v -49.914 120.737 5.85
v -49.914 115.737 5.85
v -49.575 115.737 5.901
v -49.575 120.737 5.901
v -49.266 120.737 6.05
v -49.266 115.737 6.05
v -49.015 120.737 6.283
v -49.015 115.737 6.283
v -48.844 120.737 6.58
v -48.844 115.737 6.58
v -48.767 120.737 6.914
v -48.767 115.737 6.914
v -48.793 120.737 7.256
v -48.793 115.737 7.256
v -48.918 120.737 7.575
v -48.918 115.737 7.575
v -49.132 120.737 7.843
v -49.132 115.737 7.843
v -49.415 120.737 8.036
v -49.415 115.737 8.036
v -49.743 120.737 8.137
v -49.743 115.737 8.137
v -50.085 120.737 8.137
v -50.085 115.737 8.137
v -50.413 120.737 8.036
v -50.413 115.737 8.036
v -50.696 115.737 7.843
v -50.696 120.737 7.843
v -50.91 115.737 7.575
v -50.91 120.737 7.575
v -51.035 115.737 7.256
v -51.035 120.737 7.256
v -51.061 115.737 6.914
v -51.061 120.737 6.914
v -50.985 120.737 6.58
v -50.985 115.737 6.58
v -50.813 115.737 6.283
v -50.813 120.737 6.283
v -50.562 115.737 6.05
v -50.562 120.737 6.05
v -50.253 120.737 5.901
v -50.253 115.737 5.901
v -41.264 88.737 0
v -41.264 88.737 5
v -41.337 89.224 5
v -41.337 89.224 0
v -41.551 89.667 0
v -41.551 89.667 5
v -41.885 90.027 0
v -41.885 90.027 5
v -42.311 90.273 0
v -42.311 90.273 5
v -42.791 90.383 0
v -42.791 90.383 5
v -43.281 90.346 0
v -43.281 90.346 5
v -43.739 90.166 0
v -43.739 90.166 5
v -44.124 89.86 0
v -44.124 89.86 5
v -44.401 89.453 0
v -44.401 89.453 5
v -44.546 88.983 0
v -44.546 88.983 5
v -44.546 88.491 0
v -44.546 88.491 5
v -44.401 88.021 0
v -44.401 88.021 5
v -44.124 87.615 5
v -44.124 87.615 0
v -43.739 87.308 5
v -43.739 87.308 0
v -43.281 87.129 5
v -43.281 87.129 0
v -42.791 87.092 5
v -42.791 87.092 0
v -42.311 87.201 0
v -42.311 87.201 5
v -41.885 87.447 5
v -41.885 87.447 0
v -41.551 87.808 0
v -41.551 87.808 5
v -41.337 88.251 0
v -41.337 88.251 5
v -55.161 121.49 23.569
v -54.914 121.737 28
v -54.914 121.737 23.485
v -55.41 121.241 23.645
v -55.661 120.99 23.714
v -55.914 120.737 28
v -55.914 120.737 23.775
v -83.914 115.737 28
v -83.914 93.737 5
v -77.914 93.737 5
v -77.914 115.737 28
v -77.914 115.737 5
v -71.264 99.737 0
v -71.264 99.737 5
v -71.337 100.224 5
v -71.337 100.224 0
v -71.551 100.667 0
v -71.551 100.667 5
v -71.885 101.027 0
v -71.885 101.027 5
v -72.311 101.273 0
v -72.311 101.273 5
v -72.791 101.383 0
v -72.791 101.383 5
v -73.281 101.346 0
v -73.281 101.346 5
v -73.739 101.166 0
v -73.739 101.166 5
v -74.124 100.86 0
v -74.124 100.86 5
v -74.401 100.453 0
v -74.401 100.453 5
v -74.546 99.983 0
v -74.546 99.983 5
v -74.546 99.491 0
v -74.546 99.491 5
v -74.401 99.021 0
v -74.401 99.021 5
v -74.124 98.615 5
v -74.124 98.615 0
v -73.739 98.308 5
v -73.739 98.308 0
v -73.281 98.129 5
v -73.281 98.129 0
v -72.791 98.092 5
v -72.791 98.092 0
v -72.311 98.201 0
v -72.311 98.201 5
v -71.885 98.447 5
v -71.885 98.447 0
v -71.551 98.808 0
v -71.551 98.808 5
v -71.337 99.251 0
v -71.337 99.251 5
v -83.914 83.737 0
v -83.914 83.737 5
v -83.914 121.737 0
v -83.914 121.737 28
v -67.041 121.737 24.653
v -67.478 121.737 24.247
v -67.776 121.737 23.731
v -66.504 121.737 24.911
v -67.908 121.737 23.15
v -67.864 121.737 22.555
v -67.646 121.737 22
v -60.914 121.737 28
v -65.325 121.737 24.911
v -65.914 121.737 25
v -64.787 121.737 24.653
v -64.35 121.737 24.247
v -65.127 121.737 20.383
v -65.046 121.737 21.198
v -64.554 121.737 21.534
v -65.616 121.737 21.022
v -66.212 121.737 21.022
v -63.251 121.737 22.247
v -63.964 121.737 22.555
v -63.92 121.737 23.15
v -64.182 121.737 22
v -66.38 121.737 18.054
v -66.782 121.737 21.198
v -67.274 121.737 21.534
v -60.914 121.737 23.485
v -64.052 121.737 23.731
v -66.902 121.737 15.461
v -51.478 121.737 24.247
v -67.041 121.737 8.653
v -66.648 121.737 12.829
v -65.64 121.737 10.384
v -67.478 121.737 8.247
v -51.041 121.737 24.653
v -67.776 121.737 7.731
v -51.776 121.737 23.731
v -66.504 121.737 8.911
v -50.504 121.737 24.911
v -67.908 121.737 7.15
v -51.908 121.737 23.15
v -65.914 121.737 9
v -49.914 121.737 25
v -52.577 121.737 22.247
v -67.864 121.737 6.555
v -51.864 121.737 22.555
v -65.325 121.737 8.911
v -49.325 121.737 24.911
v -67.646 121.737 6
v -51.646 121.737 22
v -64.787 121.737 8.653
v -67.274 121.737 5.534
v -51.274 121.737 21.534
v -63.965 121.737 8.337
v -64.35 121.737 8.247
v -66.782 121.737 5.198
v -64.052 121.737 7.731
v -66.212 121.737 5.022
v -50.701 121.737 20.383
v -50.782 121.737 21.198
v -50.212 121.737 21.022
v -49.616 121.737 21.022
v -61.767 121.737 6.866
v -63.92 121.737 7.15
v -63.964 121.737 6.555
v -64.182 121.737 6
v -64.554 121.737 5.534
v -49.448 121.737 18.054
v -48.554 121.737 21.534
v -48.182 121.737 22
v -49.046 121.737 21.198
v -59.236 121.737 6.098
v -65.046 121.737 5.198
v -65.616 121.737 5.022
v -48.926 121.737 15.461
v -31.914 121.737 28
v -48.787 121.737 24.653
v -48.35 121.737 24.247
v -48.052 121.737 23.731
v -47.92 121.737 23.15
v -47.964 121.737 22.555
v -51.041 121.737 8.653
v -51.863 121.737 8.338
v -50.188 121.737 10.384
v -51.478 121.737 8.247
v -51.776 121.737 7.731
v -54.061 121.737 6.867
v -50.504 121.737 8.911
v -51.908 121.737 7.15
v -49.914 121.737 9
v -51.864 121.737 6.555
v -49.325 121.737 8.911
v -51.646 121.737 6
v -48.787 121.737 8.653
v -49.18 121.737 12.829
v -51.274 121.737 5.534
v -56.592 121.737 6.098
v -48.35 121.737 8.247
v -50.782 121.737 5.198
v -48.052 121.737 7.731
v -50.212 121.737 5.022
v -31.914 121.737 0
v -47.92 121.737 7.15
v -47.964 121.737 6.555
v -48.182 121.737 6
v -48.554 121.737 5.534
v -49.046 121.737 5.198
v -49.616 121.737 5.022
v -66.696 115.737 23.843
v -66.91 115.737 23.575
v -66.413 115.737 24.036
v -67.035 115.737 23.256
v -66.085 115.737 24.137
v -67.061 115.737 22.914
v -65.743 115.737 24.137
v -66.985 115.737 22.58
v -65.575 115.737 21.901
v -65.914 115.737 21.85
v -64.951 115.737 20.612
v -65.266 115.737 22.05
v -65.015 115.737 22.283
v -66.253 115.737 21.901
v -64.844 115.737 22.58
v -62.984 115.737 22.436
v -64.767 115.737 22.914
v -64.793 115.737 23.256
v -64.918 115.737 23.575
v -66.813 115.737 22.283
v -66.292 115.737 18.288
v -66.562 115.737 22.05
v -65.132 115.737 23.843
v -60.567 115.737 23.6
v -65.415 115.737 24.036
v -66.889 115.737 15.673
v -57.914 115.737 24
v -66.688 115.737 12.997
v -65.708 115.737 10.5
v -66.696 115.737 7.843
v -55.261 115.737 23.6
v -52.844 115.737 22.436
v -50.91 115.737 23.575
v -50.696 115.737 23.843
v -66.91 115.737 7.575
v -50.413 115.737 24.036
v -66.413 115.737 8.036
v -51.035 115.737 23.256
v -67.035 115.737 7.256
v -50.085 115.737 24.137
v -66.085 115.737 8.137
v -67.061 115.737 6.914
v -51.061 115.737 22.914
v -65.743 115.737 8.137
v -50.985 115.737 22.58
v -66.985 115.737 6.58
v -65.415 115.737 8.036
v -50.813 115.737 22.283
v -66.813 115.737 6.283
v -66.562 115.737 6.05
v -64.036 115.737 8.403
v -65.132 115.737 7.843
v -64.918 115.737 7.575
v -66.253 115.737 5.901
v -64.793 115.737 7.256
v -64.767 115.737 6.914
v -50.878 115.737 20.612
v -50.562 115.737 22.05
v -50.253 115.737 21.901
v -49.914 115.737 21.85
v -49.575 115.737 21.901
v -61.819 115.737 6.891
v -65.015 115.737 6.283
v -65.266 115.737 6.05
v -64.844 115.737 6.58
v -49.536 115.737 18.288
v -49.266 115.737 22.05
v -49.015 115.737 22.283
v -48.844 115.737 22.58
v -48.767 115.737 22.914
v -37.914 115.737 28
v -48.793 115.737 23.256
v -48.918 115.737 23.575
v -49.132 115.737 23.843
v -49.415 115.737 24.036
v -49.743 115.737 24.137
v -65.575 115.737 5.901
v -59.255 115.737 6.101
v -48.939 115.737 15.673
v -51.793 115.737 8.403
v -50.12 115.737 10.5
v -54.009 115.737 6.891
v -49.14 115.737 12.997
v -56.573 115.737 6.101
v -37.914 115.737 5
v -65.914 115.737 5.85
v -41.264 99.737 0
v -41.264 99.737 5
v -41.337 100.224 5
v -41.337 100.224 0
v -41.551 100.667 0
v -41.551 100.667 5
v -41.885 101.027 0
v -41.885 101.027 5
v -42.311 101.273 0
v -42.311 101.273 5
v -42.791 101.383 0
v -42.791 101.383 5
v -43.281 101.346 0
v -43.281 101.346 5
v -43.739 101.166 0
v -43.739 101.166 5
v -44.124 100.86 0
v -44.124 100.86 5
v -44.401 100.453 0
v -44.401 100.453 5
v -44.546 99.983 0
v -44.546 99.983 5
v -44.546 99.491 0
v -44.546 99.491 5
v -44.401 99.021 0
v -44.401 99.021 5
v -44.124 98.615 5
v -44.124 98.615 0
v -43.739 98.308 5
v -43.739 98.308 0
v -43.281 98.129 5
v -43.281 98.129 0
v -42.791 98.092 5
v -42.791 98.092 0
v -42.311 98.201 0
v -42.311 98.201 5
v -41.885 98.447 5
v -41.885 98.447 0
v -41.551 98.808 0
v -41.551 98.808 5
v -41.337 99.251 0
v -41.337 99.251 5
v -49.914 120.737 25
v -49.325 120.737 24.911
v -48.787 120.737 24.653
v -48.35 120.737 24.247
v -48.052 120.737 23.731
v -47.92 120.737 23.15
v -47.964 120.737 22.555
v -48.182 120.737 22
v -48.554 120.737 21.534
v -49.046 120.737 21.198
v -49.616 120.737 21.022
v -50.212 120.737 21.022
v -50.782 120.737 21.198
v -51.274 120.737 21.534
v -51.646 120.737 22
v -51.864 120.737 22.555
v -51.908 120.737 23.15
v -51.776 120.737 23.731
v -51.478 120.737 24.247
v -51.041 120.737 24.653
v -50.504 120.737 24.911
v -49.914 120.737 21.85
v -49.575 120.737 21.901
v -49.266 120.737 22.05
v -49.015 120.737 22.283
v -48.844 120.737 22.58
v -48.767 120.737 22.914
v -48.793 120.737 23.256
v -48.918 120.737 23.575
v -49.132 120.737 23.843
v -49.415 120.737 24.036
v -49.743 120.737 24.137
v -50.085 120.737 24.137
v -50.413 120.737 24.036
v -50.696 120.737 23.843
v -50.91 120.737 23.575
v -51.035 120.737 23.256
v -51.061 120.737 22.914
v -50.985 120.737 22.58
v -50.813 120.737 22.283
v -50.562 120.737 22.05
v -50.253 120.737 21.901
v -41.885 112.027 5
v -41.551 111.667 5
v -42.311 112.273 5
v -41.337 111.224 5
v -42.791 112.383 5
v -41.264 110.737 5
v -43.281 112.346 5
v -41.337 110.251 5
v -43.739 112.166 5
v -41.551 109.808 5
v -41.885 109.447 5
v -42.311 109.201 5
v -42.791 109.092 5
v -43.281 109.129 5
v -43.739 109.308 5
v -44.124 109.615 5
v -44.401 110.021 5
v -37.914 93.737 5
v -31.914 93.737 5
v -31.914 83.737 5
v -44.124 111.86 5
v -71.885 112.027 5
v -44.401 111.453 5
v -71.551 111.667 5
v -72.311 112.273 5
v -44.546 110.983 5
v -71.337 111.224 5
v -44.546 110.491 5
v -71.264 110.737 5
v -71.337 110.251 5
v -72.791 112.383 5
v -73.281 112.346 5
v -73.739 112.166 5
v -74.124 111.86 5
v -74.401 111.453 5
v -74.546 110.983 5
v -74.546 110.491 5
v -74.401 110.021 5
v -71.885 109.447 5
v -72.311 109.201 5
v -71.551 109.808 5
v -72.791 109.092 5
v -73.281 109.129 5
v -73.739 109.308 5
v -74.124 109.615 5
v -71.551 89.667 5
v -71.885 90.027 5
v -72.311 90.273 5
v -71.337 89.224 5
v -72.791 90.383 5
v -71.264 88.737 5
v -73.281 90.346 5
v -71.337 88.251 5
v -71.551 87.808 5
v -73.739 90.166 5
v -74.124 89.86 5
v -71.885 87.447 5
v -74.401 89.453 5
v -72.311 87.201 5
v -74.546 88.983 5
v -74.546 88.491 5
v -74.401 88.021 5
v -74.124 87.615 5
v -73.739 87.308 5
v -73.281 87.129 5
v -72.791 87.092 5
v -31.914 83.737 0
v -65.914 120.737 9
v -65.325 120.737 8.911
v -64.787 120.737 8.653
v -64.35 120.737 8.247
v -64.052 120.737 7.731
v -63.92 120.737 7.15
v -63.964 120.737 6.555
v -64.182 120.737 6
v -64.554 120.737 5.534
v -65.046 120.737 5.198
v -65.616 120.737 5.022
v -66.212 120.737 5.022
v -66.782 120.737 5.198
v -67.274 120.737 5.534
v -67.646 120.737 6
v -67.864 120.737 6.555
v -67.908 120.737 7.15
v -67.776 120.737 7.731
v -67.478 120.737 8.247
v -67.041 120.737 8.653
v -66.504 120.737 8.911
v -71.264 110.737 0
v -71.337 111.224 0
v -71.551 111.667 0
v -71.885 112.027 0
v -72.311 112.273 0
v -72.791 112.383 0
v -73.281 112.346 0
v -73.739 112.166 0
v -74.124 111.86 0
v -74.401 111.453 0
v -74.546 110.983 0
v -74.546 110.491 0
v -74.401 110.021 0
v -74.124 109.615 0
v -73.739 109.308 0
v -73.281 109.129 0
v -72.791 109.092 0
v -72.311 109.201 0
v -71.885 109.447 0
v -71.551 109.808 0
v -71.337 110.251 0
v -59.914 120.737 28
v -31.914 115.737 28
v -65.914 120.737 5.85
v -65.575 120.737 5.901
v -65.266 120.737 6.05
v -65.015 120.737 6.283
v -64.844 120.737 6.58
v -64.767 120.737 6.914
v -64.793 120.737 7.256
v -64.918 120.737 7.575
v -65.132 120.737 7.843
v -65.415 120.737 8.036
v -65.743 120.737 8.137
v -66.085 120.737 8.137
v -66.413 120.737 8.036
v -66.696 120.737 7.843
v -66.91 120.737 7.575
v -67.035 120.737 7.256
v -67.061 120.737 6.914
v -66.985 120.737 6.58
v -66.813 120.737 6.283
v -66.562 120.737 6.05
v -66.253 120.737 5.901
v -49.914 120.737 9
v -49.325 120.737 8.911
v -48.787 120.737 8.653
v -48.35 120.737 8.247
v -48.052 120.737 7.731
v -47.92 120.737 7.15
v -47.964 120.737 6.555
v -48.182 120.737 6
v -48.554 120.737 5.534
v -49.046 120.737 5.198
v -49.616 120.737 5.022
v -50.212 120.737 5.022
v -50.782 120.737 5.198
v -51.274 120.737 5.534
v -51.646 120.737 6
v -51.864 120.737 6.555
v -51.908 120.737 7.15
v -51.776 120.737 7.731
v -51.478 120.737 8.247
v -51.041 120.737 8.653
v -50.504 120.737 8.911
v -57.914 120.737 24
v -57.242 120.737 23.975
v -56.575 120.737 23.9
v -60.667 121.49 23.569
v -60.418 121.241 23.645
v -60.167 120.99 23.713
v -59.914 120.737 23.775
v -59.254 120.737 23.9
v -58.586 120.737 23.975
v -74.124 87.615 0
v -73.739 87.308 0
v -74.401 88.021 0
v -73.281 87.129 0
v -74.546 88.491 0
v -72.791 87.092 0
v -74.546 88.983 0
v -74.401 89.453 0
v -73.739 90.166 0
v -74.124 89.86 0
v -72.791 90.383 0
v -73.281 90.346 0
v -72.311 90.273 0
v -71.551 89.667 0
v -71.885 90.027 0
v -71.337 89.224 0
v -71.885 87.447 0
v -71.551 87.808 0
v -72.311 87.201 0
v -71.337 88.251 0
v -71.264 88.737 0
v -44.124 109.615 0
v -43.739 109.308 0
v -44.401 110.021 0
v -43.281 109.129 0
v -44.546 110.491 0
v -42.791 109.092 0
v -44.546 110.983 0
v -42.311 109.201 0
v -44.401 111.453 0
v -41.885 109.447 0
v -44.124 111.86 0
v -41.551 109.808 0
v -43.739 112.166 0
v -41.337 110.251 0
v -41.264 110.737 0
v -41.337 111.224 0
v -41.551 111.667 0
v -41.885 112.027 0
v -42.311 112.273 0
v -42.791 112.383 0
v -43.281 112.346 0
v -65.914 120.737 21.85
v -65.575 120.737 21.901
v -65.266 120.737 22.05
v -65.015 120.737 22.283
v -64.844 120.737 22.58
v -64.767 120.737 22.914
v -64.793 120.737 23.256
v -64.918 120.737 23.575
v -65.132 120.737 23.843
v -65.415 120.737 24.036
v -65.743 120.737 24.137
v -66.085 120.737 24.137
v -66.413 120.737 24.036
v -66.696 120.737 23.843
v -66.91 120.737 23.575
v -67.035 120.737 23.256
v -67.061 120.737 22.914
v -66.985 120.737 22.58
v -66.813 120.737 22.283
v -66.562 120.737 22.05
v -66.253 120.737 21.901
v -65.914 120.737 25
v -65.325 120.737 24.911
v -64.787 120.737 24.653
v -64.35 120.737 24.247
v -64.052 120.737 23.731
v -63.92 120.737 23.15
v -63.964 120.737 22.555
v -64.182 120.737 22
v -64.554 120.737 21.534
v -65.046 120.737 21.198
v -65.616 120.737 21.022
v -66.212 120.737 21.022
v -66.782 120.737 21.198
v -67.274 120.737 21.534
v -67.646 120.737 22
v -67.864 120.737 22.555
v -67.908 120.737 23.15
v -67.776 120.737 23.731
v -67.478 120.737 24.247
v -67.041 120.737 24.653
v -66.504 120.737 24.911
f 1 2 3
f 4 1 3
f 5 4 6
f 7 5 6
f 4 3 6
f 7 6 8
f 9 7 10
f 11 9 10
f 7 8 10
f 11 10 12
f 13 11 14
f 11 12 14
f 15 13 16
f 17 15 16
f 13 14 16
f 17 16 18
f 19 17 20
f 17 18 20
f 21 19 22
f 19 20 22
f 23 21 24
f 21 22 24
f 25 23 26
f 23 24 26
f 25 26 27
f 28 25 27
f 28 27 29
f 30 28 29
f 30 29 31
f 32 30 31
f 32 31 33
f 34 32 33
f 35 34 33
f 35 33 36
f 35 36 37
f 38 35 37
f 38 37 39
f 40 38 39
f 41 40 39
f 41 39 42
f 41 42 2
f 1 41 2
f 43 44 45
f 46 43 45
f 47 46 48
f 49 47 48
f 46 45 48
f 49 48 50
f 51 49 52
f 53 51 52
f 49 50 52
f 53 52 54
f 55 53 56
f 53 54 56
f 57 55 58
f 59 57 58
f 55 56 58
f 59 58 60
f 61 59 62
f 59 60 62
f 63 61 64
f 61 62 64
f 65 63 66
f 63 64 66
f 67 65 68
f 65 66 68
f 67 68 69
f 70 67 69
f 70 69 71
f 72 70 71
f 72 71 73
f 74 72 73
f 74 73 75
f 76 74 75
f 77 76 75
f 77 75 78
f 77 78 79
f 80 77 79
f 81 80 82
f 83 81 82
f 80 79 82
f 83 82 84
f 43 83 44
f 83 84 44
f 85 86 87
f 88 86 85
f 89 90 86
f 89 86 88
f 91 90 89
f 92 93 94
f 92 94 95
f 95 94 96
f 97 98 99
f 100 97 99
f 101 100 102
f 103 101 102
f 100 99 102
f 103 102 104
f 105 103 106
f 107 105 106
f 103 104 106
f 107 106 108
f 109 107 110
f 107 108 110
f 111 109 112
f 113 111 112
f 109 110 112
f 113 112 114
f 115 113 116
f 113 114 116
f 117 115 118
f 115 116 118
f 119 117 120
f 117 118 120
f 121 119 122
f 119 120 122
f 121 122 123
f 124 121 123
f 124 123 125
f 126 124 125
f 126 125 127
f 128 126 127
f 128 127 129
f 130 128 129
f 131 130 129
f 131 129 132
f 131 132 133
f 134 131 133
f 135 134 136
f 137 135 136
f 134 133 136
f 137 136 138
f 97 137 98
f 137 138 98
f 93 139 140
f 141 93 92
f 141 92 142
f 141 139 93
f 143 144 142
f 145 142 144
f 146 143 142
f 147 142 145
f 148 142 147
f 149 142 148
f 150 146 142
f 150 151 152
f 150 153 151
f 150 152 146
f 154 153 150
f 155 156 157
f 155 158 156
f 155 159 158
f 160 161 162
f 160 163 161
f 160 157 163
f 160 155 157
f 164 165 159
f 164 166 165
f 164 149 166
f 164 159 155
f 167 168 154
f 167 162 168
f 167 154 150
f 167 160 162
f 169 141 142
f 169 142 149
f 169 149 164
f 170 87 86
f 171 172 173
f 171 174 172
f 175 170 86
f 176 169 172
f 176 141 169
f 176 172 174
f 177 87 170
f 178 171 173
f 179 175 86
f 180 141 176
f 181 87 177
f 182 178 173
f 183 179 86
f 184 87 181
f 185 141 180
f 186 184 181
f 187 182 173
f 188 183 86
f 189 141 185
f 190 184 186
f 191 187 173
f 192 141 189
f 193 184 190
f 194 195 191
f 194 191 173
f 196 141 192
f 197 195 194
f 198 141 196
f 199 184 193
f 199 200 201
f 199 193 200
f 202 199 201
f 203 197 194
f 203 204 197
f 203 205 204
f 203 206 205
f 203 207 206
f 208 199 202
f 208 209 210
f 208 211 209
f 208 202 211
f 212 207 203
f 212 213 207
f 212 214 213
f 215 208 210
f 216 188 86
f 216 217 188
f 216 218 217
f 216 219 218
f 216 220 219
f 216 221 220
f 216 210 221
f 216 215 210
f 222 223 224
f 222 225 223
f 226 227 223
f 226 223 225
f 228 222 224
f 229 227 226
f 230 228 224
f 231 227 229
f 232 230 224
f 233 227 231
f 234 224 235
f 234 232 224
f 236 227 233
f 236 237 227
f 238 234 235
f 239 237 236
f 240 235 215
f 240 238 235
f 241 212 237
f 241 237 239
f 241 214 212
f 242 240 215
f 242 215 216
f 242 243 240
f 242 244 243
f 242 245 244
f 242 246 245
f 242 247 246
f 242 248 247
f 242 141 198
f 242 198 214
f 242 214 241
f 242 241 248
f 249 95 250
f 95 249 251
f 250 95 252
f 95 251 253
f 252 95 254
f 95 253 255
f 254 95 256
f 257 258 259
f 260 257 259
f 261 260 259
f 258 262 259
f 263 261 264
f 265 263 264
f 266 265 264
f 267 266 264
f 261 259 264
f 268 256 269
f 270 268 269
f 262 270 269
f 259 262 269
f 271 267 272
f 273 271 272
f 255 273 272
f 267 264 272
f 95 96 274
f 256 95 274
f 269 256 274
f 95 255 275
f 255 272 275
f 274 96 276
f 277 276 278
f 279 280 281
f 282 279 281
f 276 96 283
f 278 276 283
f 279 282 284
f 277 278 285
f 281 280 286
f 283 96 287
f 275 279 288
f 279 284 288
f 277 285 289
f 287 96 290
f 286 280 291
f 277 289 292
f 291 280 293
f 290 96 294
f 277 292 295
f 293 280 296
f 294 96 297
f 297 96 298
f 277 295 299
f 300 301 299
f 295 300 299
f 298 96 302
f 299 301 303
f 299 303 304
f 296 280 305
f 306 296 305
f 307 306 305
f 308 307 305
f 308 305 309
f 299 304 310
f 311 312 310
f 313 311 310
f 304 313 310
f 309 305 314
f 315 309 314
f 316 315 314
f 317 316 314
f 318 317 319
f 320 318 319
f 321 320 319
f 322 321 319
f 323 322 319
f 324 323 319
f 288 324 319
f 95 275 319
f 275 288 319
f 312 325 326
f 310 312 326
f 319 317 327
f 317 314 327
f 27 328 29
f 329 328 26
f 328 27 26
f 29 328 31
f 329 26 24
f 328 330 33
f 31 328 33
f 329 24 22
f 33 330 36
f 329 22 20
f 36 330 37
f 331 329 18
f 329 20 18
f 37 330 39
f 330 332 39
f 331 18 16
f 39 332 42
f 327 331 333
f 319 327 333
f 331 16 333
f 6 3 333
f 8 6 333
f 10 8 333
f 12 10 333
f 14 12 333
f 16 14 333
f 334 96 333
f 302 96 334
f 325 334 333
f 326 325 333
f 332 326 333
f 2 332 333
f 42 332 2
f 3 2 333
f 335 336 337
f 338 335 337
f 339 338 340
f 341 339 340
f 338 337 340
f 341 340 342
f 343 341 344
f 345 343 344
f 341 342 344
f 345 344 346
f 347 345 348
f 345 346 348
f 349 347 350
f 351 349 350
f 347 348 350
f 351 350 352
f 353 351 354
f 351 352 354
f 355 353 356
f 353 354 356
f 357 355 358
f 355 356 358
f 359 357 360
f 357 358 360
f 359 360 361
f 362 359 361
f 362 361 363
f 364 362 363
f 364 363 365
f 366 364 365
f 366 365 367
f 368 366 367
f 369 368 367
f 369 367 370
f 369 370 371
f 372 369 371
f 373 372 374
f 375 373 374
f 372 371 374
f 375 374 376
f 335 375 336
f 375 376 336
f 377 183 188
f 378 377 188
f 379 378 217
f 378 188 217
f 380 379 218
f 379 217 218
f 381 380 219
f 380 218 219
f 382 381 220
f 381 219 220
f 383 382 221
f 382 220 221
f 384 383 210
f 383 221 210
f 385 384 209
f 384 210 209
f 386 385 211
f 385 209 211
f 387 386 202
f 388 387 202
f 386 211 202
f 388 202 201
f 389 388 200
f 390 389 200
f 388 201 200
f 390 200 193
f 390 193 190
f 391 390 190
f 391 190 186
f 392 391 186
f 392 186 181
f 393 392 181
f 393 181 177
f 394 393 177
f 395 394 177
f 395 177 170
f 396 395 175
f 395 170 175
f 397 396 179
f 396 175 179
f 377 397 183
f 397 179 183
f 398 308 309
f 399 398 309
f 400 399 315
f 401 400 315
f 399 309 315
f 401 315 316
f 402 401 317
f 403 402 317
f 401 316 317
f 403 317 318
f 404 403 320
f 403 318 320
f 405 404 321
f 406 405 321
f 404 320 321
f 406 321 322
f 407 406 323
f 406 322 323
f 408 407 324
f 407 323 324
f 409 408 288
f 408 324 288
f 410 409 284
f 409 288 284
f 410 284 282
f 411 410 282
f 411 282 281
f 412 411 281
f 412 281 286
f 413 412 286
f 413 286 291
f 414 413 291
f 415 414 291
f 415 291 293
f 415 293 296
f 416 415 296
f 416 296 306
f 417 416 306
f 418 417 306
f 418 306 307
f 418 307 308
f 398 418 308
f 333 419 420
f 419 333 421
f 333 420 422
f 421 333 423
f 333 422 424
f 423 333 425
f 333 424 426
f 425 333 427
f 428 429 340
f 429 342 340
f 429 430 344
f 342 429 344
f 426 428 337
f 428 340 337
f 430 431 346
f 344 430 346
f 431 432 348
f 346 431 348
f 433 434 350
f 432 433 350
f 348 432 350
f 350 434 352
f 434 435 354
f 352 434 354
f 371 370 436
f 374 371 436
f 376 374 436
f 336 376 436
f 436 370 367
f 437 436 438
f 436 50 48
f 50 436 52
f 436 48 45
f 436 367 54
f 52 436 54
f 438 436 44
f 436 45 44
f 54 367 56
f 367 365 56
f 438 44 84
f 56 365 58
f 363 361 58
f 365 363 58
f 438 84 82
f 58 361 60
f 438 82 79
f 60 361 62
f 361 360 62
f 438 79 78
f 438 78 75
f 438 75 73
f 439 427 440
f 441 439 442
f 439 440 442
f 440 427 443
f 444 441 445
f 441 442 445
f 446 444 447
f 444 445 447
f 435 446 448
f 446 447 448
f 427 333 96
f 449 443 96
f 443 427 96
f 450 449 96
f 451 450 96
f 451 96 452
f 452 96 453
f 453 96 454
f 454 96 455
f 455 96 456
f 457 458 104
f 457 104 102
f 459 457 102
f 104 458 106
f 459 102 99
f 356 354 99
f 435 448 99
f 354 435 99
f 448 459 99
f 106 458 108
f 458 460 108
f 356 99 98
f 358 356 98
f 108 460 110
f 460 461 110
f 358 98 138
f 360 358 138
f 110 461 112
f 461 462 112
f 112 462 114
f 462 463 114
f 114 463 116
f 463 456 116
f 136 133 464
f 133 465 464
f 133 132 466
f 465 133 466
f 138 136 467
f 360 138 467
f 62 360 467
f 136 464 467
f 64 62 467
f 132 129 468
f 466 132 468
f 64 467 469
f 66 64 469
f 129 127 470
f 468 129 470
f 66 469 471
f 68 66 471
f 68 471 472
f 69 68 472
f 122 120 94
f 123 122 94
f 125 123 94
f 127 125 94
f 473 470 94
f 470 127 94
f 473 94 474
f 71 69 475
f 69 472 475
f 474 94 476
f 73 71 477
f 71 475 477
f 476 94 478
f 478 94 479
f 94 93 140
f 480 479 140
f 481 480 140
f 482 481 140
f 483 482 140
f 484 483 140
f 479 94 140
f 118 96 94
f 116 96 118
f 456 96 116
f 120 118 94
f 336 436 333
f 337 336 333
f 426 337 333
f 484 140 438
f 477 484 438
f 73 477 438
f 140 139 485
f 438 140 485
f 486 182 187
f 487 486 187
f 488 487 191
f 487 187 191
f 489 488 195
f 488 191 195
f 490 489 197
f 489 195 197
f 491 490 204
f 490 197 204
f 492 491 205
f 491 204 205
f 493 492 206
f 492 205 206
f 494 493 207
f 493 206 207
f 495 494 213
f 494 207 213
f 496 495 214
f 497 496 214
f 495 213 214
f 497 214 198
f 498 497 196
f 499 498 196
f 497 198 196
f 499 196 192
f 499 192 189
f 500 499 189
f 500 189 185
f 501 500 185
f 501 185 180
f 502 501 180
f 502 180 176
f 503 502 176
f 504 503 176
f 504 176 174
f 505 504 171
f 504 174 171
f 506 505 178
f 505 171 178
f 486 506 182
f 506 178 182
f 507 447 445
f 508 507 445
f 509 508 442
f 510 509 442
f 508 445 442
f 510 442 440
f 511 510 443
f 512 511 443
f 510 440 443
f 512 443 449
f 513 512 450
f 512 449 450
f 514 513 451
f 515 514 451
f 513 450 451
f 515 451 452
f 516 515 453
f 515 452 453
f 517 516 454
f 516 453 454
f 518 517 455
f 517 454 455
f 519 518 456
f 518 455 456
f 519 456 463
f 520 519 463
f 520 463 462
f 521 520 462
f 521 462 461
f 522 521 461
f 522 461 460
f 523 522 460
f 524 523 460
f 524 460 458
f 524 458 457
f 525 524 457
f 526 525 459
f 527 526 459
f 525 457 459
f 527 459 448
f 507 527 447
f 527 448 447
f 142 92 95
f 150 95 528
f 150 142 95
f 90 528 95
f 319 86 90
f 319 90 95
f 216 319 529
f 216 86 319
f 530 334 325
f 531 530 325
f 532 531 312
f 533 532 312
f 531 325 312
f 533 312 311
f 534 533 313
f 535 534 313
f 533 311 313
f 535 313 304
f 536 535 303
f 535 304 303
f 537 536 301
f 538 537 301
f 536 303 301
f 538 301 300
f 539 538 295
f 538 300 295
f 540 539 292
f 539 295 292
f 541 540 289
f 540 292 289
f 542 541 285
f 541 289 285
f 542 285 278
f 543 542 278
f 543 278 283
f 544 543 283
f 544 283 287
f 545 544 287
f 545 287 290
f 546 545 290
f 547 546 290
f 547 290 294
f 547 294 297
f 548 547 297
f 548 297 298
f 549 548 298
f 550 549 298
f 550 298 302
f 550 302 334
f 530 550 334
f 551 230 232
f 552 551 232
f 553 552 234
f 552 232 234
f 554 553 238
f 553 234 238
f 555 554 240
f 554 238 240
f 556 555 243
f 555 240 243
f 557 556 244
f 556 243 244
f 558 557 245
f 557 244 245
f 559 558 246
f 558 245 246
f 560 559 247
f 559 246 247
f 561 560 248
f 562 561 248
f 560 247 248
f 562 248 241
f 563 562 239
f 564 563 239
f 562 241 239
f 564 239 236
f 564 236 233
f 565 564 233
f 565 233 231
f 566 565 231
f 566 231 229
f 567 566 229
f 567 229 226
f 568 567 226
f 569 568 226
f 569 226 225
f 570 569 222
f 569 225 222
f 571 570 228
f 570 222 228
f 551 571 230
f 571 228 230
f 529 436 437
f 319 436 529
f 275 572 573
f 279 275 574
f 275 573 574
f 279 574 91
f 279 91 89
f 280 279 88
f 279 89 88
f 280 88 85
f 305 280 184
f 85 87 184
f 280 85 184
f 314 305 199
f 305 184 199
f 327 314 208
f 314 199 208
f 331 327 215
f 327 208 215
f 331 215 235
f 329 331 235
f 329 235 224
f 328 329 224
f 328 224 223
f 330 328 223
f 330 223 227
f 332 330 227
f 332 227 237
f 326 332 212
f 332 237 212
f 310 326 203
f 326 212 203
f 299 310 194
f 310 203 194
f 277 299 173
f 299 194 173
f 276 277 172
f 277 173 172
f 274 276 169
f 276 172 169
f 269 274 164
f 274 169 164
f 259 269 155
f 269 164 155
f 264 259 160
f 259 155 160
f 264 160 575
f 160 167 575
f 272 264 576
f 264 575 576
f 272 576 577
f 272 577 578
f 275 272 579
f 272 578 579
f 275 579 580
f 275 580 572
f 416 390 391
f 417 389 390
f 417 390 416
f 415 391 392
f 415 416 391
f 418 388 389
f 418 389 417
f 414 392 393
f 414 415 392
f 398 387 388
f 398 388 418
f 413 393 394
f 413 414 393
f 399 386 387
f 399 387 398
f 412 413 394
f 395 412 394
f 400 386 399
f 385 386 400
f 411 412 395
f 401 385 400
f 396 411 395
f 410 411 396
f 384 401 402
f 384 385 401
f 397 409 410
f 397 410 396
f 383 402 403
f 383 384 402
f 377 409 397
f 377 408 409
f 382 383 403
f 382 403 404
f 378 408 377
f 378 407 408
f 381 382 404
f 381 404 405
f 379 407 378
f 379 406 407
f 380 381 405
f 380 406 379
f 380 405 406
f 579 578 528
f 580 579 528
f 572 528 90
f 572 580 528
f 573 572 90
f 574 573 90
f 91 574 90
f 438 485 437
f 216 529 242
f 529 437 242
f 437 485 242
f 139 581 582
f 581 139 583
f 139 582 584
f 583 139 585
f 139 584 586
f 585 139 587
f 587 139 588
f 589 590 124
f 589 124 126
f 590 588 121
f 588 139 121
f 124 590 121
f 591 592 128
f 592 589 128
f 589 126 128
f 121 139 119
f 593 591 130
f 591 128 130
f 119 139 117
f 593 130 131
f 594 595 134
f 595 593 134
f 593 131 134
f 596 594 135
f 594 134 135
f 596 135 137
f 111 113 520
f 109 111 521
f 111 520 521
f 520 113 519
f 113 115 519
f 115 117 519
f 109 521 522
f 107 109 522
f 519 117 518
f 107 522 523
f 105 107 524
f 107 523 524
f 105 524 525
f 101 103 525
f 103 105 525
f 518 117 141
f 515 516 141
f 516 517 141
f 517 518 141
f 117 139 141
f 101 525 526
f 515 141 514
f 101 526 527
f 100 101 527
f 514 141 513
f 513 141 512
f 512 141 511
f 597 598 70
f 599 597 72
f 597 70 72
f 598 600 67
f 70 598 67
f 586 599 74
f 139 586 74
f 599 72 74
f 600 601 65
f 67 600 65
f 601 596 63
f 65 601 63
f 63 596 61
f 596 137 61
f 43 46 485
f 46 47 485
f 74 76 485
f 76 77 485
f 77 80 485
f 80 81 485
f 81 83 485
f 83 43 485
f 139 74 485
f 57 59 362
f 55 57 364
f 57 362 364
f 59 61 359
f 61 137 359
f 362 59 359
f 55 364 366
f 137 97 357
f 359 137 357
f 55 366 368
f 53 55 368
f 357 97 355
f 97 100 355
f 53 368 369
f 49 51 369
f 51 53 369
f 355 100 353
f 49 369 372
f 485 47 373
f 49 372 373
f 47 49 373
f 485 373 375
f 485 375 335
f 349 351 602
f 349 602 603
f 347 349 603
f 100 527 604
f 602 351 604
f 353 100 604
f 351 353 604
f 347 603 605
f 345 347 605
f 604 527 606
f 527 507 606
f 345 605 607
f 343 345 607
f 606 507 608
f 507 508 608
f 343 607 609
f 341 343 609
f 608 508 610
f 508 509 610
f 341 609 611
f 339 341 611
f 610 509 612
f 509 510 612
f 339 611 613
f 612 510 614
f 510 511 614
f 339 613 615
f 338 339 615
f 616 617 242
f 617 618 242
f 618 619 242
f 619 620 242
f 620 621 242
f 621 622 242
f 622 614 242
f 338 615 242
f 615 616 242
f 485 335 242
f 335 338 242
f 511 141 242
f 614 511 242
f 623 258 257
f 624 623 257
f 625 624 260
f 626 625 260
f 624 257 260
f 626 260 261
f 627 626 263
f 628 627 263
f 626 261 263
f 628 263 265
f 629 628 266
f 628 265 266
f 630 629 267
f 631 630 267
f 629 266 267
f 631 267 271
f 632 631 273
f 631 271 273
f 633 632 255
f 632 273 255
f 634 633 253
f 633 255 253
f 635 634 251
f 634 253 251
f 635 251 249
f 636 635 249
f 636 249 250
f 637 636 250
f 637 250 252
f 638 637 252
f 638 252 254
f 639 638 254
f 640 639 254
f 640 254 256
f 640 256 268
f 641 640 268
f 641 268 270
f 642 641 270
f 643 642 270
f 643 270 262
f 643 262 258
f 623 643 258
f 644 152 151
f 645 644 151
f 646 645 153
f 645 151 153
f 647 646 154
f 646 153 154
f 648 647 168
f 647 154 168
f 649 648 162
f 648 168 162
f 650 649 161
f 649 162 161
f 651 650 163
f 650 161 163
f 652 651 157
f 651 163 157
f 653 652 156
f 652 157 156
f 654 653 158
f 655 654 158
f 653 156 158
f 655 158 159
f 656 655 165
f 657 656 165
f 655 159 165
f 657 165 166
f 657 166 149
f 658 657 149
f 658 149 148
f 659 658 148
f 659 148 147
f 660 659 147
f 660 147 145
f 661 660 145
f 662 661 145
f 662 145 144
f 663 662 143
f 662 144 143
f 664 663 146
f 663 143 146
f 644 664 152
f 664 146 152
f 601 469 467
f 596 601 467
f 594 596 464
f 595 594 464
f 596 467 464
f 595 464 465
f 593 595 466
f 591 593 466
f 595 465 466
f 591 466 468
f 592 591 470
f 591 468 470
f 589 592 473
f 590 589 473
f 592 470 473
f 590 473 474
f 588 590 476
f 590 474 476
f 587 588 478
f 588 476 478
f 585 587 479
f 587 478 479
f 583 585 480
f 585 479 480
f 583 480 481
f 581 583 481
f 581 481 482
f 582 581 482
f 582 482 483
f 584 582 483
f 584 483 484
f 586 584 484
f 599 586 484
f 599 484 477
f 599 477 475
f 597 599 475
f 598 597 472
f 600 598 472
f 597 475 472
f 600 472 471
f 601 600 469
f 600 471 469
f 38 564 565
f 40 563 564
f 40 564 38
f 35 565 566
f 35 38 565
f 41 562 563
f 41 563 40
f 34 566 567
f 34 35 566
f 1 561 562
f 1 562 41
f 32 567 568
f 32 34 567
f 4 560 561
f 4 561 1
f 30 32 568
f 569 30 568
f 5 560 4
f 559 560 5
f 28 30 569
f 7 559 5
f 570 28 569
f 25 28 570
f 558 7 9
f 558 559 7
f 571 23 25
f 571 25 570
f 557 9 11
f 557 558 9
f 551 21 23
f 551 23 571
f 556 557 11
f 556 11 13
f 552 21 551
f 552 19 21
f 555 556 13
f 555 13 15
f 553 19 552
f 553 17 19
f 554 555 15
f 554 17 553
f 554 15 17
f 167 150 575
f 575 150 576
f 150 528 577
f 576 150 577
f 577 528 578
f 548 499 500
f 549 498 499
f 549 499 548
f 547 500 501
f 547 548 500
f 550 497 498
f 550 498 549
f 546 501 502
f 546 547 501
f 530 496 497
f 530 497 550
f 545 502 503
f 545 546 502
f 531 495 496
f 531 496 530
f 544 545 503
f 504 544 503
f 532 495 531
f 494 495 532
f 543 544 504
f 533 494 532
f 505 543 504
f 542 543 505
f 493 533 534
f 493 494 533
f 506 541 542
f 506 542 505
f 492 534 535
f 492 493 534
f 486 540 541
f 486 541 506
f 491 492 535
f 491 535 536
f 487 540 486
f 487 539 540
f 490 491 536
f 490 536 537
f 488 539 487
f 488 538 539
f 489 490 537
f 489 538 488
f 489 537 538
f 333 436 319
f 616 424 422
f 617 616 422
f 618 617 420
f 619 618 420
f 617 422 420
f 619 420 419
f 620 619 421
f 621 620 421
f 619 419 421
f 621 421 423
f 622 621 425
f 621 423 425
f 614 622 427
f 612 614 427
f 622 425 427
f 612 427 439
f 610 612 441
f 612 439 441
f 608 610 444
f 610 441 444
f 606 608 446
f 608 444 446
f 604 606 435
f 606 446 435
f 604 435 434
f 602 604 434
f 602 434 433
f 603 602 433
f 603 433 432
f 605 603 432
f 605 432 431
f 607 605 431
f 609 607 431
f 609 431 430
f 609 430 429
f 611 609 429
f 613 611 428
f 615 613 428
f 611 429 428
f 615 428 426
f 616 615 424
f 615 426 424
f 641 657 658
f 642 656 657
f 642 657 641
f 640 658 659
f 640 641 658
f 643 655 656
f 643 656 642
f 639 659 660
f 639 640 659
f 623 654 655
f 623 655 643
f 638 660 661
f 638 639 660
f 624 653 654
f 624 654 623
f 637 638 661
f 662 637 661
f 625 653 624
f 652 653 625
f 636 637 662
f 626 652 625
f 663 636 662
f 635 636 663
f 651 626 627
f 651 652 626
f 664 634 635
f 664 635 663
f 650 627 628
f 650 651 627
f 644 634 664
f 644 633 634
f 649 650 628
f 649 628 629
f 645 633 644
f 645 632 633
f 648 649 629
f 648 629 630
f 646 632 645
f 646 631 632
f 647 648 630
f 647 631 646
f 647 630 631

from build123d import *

# Parameters (mm, degrees)
SKETCH1_W           = 52
SKETCH1_H           = 38
BOSS_EXTRUDE1_DEPTH = 5
SKETCH2_W           = 52
SKETCH2_H           = 6
BOSS_EXTRUDE2_DEPTH = 23
SKETCH3_R           = 9
CUT_EXTRUDE1_DEPTH  = 6
SKETCH4_R           = 1.15
CUT_EXTRUDE2_DEPTH  = 6
SKETCH5_W           = 6
SKETCH5_H           = 32
BOSS_EXTRUDE3_DEPTH = 23
CUT_EXTRUDE3_DEPTH  = 136.306891562
SKETCH7_R           = 1.65
CUT_EXTRUDE4_DEPTH  = 5
SKETCH8_R           = 1.65
CUT_EXTRUDE5_DEPTH  = 5
SKETCH9_W           = 6
SKETCH9_H           = 4.814654703
CUT_EXTRUDE6_DEPTH  = 1
CHAMFER1_SIZE       = 1
SKETCH10_R          = 2
CUT_EXTRUDE7_DEPTH  = 1


with BuildPart() as part:
    # Sketch1 → Boss-Extrude1 (new body)
    with BuildSketch(Plane.XY):
        with Locations((-57.914180529, 102.737237131)):
            Rectangle(SKETCH1_W, SKETCH1_H)
    extrude(amount=BOSS_EXTRUDE1_DEPTH)

    # Sketch2 → Boss-Extrude2 (add)
    with BuildSketch(Plane.XY.offset(5)):
        with Locations((-57.914180529, 118.737237131)):
            Rectangle(SKETCH2_W, SKETCH2_H)
    extrude(amount=BOSS_EXTRUDE2_DEPTH)

    # Sketch3 → Cut-Extrude1 (cut)
    with BuildSketch(Plane(origin=(0, 121.737237131, 0), x_dir=(1, 0, 0), z_dir=(0, 1, 0))):
        with Locations(Location((-57.914080529, -15.0001, 0), (0, 0, 270))):
            Circle(SKETCH3_R)
    extrude(amount=-CUT_EXTRUDE1_DEPTH, mode=Mode.SUBTRACT)

    # Sketch4 → Cut-Extrude2 (cut)
    with BuildSketch(Plane.XZ.offset(-115.737237131)):
        with Locations(Location((-65.914080529, 23.0001, 0), (0, 0, 270))):
            Circle(SKETCH4_R)
        with Locations(Location((-49.914080529, 23.0001, 0), (0, 0, 270))):
            Circle(SKETCH4_R)
        with Locations(Location((-49.914080529, 7.0001, 0), (0, 0, 270))):
            Circle(SKETCH4_R)
        with Locations(Location((-65.914080529, 7.0001, 0), (0, 0, 270))):
            Circle(SKETCH4_R)
    extrude(amount=-CUT_EXTRUDE2_DEPTH, mode=Mode.SUBTRACT)

    # Sketch5 → Boss-Extrude3 (add)
    with BuildSketch(Plane.XY.offset(5)):
        with Locations((-80.914180529, 99.737237131)):
            Rectangle(SKETCH5_W, SKETCH5_H)
        with Locations((-34.914180529, 99.737237131)):
            Rectangle(SKETCH5_W, SKETCH5_H)
    extrude(amount=BOSS_EXTRUDE3_DEPTH)

    # Sketch6 → Cut-Extrude3 (cut, through all)
    with BuildSketch(Plane.ZY.offset(83.914180529)):
        Polygon((5, 83.737237131), (5, 93.737237131), (28, 115.737237131), (34.8001915, 115.737237131), (34.8001915, 79.151046586), (5, 79.151046586), align=None)
    extrude(amount=-CUT_EXTRUDE3_DEPTH, mode=Mode.SUBTRACT)

    # Sketch7 → Cut-Extrude4 (cut)
    with BuildSketch(Plane.XY.offset(5)):
        with Locations((-42.914180529, 110.737237131)):
            Circle(SKETCH7_R)
        with Locations((-42.914180529, 88.737237131)):
            Circle(SKETCH7_R)
        with Locations((-72.914180529, 110.737237131)):
            Circle(SKETCH7_R)
        with Locations((-72.914180529, 88.737237131)):
            Circle(SKETCH7_R)
    extrude(amount=-CUT_EXTRUDE4_DEPTH, mode=Mode.SUBTRACT)

    # Sketch8 → Cut-Extrude5 (cut)
    with BuildSketch(Plane.XY.offset(5)):
        with Locations((-72.914180529, 99.737237131)):
            Circle(SKETCH8_R)
        with Locations((-42.914180529, 99.737237131)):
            Circle(SKETCH8_R)
    extrude(amount=-CUT_EXTRUDE5_DEPTH, mode=Mode.SUBTRACT)

    # Sketch9 → Cut-Extrude6 (cut)
    with BuildSketch(Plane(origin=(0, 121.737237131, 0), x_dir=(1, 0, 0), z_dir=(0, 1, 0))):
        with Locations((-57.914180529, -25.592672648)):
            Rectangle(SKETCH9_W, SKETCH9_H)
    extrude(amount=-CUT_EXTRUDE6_DEPTH, mode=Mode.SUBTRACT)

    # Chamfer1
    chamfer1_edges = [part.edges().sort_by_distance(p)[0] for p in [
        (-60.914180529, 120.737237131, 25.742673009),
        (-54.914180529, 120.737237131, 25.742708364),
    ]]
    chamfer(chamfer1_edges, length=CHAMFER1_SIZE - 0.0001)  # a hair under: the kernel refuses the full size

    # Sketch10 → Cut-Extrude7 (cut)
    with BuildSketch(Plane(origin=(0, 121.737237131, 0), x_dir=(1, 0, 0), z_dir=(0, 1, 0))):
        with Locations(Location((-65.914080529, -7.0001, 0), (0, 0, 270))):
            Circle(SKETCH10_R)
        with Locations(Location((-49.914080529, -7.0001, 0), (0, 0, 270))):
            Circle(SKETCH10_R)
        with Locations(Location((-49.914080529, -23.0001, 0), (0, 0, 270))):
            Circle(SKETCH10_R)
        with Locations(Location((-65.914080529, -23.0001, 0), (0, 0, 270))):
            Circle(SKETCH10_R)
    extrude(amount=-CUT_EXTRUDE7_DEPTH, mode=Mode.SUBTRACT)


solid = part.part
